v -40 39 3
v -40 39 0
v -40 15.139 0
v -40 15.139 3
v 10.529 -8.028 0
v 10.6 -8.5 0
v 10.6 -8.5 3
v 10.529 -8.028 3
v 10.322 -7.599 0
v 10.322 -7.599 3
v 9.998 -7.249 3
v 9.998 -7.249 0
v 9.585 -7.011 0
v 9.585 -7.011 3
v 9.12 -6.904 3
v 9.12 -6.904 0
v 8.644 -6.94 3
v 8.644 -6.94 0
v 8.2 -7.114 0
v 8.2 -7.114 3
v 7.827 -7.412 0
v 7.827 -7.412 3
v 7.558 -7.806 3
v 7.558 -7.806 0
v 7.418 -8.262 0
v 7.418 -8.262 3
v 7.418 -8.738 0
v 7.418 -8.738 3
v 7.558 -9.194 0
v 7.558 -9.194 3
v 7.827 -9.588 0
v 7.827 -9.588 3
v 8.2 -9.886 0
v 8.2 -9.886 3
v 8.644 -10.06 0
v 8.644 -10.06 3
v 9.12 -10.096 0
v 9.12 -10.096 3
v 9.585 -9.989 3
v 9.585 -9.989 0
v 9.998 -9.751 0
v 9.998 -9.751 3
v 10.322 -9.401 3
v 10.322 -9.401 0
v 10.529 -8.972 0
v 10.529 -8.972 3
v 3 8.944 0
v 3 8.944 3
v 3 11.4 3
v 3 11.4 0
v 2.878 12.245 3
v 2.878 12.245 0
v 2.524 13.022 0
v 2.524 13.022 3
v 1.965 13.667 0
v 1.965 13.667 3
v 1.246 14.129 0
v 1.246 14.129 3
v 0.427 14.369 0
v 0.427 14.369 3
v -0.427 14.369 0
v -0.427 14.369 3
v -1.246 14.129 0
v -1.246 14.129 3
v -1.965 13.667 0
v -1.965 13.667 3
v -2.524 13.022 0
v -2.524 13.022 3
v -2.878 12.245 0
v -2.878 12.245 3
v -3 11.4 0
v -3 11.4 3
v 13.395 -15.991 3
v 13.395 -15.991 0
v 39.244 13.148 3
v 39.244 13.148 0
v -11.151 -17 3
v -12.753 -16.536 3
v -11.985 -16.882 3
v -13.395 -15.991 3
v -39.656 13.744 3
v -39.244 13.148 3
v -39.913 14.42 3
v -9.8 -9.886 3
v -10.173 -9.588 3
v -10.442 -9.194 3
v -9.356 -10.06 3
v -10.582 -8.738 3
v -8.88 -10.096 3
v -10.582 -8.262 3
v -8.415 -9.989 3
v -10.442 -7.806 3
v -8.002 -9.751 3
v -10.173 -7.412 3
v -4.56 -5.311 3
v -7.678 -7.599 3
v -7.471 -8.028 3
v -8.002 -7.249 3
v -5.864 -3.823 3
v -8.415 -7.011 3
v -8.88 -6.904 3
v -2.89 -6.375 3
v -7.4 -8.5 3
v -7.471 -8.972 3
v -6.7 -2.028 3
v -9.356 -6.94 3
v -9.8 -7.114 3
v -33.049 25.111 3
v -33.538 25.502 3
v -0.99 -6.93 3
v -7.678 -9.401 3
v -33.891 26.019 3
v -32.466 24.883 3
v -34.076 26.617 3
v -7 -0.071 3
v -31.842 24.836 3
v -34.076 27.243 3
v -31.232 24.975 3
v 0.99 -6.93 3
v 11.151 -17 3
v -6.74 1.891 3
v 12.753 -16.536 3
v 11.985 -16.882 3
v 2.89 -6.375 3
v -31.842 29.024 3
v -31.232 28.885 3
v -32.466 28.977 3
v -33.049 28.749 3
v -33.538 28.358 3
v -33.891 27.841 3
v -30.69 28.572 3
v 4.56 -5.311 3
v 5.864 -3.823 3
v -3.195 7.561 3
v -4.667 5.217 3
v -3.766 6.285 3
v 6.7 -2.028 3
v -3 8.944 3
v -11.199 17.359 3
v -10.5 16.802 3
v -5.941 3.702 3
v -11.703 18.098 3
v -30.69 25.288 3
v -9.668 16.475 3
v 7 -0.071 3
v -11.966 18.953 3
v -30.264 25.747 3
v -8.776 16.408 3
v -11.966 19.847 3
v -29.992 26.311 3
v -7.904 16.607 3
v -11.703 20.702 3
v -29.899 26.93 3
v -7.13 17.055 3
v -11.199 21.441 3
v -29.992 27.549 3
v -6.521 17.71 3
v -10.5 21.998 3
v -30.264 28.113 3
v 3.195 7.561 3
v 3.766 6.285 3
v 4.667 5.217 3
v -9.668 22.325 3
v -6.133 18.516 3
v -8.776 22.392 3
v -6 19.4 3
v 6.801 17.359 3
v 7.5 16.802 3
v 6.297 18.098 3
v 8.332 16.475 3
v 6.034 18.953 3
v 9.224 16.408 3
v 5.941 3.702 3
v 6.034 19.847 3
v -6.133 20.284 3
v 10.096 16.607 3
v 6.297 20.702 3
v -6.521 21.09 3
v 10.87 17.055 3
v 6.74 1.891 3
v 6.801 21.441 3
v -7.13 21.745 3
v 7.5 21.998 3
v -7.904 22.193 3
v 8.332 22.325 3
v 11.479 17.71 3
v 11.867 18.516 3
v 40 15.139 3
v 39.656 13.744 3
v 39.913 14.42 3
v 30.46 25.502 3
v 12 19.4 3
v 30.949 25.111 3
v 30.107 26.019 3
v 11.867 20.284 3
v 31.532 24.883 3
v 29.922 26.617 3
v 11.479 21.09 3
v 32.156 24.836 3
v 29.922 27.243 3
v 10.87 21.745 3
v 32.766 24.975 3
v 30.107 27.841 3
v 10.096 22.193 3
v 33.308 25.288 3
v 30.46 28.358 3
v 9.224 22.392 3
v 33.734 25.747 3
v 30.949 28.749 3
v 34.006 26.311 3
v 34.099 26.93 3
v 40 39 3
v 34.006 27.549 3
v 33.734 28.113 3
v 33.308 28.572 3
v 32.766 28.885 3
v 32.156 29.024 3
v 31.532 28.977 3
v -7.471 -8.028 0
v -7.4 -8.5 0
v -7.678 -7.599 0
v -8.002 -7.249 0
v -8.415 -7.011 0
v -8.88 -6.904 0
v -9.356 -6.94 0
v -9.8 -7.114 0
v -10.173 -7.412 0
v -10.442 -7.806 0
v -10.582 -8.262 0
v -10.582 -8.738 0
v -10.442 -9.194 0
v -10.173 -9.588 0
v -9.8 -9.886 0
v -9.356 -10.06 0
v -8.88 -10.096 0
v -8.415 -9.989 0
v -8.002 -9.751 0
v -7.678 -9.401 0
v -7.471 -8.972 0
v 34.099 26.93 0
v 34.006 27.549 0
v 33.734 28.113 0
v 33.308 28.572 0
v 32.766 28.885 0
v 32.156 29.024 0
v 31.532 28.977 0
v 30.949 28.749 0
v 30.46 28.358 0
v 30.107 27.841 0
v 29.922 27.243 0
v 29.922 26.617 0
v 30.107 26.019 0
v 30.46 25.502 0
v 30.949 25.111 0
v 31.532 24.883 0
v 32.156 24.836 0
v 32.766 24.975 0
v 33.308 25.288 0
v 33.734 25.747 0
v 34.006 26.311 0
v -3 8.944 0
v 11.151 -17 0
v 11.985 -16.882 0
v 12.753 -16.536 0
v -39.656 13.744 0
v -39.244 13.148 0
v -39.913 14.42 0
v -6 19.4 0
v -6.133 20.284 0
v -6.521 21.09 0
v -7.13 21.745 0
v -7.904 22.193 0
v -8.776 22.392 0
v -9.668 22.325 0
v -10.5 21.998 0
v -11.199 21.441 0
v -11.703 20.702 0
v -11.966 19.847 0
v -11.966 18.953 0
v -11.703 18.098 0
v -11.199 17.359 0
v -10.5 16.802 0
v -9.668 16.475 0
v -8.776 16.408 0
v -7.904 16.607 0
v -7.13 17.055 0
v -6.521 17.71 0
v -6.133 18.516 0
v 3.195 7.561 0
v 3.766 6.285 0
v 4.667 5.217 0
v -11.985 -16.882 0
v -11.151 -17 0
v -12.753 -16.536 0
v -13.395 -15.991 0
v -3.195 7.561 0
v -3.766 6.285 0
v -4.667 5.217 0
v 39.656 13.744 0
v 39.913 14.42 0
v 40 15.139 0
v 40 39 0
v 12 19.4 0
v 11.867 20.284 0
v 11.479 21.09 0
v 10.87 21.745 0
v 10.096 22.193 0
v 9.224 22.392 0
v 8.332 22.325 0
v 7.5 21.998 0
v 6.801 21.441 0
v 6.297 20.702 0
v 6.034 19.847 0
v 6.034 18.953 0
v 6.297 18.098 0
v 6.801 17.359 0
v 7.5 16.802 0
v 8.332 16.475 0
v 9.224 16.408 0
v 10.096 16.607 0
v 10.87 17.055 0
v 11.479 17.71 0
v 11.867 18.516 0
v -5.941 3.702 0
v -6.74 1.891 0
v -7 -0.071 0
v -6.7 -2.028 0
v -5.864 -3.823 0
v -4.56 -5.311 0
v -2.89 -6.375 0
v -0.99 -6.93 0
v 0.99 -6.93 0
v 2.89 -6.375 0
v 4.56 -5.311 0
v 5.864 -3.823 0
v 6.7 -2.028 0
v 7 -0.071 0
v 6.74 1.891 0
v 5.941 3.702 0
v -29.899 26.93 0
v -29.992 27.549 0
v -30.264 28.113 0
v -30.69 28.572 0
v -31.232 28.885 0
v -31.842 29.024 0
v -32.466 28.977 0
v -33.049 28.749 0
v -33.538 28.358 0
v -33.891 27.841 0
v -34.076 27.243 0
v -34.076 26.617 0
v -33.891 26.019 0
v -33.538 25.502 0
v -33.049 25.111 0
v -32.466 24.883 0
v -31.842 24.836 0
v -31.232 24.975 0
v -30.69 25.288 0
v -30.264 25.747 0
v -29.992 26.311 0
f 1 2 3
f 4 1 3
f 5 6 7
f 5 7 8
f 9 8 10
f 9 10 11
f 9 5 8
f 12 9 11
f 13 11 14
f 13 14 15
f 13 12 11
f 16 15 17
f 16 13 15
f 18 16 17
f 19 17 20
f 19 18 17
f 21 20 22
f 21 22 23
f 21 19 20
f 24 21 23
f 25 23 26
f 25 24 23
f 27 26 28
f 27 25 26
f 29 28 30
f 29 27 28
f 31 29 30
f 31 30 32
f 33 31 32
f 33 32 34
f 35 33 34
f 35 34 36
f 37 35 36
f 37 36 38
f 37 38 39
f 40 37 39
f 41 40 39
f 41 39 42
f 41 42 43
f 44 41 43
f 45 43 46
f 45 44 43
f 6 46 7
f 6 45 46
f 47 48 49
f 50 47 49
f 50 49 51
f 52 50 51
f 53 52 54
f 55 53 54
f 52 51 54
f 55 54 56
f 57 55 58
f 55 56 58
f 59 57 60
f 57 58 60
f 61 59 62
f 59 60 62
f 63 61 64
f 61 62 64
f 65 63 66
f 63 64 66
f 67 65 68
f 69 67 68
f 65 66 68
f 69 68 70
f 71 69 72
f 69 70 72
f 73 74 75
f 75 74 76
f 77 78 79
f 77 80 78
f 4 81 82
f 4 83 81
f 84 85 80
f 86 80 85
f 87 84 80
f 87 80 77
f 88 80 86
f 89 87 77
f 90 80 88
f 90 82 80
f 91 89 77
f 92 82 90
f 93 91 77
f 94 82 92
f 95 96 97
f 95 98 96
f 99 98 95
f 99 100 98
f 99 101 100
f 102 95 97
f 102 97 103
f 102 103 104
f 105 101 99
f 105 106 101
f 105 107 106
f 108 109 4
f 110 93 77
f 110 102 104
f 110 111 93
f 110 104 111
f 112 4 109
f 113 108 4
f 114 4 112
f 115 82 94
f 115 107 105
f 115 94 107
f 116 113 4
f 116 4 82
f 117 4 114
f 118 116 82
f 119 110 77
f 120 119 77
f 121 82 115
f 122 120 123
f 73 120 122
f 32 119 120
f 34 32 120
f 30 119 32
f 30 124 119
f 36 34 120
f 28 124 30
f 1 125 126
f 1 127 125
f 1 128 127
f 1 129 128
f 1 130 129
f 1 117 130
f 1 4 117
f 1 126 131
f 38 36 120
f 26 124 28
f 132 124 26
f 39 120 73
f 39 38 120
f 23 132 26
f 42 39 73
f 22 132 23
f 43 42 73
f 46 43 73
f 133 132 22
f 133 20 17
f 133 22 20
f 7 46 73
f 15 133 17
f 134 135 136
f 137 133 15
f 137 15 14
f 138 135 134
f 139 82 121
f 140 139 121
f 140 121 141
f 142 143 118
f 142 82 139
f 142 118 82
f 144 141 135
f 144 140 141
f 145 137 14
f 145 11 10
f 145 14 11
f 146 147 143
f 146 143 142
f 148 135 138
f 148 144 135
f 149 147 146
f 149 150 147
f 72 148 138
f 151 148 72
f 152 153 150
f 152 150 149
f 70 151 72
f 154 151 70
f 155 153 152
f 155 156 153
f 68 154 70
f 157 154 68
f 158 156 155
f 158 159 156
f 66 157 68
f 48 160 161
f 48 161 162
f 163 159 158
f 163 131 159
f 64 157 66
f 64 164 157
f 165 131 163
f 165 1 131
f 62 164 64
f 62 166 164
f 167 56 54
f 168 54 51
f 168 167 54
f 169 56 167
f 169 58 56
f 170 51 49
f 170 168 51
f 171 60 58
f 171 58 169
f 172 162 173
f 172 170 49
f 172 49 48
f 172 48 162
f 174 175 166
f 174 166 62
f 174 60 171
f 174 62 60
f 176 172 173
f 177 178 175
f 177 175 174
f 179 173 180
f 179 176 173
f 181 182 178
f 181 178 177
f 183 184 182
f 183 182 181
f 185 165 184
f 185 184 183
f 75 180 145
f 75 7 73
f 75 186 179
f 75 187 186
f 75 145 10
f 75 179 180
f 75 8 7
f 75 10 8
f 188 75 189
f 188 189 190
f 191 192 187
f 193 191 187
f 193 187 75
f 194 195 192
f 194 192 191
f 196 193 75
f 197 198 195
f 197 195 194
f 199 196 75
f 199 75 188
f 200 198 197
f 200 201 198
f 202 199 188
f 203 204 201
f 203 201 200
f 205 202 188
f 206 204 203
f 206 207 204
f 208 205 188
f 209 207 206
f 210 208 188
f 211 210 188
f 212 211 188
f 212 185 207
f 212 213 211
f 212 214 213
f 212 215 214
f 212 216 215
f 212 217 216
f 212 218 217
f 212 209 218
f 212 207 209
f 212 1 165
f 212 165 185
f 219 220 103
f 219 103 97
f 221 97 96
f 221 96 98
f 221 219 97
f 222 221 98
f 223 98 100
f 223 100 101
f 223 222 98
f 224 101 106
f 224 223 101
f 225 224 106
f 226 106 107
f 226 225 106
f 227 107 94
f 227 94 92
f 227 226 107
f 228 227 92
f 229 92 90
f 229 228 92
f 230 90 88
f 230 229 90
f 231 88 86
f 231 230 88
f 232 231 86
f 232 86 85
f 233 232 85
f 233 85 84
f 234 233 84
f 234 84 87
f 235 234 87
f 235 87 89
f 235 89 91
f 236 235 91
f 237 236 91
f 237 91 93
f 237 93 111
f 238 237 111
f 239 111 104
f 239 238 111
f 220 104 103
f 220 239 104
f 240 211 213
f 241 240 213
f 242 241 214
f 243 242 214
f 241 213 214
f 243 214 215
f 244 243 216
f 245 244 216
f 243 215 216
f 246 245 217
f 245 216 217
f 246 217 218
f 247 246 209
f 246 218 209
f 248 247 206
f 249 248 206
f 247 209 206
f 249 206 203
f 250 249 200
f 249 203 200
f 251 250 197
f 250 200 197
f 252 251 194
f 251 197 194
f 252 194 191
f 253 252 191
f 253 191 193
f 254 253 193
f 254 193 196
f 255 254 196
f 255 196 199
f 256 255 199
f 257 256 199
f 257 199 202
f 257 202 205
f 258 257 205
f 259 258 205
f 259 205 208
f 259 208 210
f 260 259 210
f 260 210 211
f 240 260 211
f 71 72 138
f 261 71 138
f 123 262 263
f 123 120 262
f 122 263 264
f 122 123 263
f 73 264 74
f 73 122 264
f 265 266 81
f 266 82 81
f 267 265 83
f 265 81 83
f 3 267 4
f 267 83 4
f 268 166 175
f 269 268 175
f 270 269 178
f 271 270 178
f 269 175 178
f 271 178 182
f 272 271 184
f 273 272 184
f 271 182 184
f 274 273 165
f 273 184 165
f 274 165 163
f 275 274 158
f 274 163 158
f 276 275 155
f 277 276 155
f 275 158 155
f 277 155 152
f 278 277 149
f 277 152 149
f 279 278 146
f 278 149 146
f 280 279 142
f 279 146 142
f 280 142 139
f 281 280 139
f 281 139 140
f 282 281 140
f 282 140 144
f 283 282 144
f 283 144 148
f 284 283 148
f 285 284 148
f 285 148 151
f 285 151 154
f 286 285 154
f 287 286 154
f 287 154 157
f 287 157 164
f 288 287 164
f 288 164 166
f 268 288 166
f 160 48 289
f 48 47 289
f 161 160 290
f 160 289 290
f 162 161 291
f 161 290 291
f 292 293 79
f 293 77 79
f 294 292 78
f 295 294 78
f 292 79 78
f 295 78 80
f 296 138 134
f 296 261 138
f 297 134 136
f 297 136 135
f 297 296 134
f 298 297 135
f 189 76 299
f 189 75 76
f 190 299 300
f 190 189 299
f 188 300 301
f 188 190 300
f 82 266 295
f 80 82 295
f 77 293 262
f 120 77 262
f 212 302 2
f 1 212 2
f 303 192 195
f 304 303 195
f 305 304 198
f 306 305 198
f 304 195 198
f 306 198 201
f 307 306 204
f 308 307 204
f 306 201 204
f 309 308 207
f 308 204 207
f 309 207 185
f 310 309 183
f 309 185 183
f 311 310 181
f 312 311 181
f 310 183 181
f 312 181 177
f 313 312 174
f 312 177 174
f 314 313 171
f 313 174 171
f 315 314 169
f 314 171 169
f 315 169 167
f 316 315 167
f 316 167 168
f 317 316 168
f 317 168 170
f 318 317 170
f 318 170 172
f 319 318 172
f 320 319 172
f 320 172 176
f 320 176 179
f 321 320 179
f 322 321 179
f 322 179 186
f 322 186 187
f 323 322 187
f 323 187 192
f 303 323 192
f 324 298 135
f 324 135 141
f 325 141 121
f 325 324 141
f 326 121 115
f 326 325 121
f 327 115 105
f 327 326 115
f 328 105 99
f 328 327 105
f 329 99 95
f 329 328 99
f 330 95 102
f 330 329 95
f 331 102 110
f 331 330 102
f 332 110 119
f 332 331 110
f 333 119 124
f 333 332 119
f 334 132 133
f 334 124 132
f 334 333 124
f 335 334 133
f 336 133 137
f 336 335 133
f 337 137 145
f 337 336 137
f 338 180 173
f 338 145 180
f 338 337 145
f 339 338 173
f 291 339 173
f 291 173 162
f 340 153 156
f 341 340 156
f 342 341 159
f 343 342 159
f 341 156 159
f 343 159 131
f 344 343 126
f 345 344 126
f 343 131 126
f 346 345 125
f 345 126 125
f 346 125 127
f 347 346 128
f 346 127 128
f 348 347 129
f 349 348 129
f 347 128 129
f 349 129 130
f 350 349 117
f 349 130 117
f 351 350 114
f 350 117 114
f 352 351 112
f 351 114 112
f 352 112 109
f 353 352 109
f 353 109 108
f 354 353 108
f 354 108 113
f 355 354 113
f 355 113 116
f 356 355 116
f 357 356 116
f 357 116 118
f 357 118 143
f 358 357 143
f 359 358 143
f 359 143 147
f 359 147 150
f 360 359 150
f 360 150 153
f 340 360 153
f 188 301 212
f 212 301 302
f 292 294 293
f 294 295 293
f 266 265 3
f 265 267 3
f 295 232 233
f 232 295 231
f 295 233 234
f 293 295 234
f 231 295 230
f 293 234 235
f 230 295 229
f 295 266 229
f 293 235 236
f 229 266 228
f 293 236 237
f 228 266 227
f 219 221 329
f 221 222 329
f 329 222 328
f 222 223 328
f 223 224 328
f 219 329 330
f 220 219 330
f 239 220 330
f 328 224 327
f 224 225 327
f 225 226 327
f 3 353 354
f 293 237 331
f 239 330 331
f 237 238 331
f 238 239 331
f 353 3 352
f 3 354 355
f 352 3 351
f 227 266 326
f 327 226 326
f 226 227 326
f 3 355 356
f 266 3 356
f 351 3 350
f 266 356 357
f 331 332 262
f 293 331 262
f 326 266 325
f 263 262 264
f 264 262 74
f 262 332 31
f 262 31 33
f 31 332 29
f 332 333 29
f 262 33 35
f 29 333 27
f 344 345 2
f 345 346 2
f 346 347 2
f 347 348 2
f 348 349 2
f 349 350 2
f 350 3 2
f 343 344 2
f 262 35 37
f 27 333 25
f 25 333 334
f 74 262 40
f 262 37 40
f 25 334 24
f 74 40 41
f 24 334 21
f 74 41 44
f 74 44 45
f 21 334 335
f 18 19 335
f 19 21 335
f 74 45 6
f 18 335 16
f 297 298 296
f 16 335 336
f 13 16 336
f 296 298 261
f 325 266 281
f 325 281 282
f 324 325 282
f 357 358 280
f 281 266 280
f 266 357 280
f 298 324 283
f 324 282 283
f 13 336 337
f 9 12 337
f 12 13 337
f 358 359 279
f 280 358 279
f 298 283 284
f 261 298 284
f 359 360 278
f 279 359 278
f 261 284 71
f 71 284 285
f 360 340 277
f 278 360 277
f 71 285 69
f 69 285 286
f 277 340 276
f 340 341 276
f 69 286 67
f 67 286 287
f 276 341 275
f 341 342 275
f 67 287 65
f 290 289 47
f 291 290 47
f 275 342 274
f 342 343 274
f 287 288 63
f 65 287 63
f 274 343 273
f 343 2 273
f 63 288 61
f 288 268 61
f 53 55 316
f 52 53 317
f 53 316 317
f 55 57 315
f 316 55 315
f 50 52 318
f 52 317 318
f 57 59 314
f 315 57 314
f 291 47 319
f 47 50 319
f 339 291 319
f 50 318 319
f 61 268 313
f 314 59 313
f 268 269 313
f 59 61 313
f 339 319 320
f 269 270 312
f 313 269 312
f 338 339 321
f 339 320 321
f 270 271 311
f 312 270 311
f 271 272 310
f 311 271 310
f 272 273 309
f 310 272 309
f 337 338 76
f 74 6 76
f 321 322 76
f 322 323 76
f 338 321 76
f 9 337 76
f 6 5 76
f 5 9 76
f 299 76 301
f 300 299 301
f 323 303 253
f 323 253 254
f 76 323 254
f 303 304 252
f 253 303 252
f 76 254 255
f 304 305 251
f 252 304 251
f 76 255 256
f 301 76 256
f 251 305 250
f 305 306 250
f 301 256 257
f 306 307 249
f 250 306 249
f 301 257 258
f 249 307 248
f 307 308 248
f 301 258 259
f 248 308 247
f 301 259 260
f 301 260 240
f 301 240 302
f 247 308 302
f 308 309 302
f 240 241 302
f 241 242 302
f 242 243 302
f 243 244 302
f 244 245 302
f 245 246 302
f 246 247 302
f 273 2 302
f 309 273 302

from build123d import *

# Parameters (mm, degrees)
SKETCH2_R           = 7
SKETCH2_R_2         = 1.6
BOSS_EXTRUDE1_DEPTH = 3
SKETCH3_R           = 2.1
CUT_EXTRUDE1_DEPTH  = 10
FILLET1_R           = 3
SKETCH4_R           = 3
CUT_EXTRUDE2_DEPTH  = 10
FILLET2_R           = 5


with BuildPart() as part:
    # Sketch2 → Boss-Extrude1 (new body)
    with BuildSketch(Plane.XY):
        Polygon((-12.5, -17), (12.5, -17), (40, 14), (40, 39), (-40, 39), (-40, 14), align=None)
        Circle(SKETCH2_R, mode=Mode.SUBTRACT)
        with Locations((-9, -8.5)):
            Circle(SKETCH2_R_2, mode=Mode.SUBTRACT)
        with Locations((9, -8.5)):
            Circle(SKETCH2_R_2, mode=Mode.SUBTRACT)
    extrude(amount=BOSS_EXTRUDE1_DEPTH)

    # Sketch3 → Cut-Extrude1 (cut)
    with BuildSketch(Plane.XY.offset(3)):
        with Locations((31.999, 26.93)):
            Circle(SKETCH3_R)
        with Locations((-31.999, 26.93)):
            Circle(SKETCH3_R)
    extrude(amount=-CUT_EXTRUDE1_DEPTH, mode=Mode.SUBTRACT)

    # Fillet1
    fillet1_edges = [part.edges().sort_by_distance(p)[0] for p in [
        (-40, 14, 1.5),
        (40, 14, 1.5),
        (12.5, -17, 1.5),
        (-12.5, -17, 1.5),
    ]]
    fillet(fillet1_edges, radius=FILLET1_R)

    # Sketch4 → Cut-Extrude2 (cut)
    with BuildSketch(Plane.XY.offset(3)):
        with Locations((9, 19.4)):
            Circle(SKETCH4_R)
        with Locations((-9, 19.4)):
            Circle(SKETCH4_R)
        with BuildLine():
            Line((-3, 11.4), (-3, 6.32455532))
            ThreePointArc((-3, 6.32455532), (0, 7), (3, 6.32455532))
            Line((3, 6.32455532), (3, 11.4))
            ThreePointArc((3, 11.4), (0, 14.4), (-3, 11.4))
        make_face()
    extrude(amount=-CUT_EXTRUDE2_DEPTH, mode=Mode.SUBTRACT)

    # Fillet2
    fillet2_edges = [part.edges().sort_by_distance(p)[0] for p in [
        (-3, 6.32455532, 1.5),
        (3, 6.32455532, 1.5),
    ]]
    fillet(fillet2_edges, radius=FILLET2_R)


solid = part.part
